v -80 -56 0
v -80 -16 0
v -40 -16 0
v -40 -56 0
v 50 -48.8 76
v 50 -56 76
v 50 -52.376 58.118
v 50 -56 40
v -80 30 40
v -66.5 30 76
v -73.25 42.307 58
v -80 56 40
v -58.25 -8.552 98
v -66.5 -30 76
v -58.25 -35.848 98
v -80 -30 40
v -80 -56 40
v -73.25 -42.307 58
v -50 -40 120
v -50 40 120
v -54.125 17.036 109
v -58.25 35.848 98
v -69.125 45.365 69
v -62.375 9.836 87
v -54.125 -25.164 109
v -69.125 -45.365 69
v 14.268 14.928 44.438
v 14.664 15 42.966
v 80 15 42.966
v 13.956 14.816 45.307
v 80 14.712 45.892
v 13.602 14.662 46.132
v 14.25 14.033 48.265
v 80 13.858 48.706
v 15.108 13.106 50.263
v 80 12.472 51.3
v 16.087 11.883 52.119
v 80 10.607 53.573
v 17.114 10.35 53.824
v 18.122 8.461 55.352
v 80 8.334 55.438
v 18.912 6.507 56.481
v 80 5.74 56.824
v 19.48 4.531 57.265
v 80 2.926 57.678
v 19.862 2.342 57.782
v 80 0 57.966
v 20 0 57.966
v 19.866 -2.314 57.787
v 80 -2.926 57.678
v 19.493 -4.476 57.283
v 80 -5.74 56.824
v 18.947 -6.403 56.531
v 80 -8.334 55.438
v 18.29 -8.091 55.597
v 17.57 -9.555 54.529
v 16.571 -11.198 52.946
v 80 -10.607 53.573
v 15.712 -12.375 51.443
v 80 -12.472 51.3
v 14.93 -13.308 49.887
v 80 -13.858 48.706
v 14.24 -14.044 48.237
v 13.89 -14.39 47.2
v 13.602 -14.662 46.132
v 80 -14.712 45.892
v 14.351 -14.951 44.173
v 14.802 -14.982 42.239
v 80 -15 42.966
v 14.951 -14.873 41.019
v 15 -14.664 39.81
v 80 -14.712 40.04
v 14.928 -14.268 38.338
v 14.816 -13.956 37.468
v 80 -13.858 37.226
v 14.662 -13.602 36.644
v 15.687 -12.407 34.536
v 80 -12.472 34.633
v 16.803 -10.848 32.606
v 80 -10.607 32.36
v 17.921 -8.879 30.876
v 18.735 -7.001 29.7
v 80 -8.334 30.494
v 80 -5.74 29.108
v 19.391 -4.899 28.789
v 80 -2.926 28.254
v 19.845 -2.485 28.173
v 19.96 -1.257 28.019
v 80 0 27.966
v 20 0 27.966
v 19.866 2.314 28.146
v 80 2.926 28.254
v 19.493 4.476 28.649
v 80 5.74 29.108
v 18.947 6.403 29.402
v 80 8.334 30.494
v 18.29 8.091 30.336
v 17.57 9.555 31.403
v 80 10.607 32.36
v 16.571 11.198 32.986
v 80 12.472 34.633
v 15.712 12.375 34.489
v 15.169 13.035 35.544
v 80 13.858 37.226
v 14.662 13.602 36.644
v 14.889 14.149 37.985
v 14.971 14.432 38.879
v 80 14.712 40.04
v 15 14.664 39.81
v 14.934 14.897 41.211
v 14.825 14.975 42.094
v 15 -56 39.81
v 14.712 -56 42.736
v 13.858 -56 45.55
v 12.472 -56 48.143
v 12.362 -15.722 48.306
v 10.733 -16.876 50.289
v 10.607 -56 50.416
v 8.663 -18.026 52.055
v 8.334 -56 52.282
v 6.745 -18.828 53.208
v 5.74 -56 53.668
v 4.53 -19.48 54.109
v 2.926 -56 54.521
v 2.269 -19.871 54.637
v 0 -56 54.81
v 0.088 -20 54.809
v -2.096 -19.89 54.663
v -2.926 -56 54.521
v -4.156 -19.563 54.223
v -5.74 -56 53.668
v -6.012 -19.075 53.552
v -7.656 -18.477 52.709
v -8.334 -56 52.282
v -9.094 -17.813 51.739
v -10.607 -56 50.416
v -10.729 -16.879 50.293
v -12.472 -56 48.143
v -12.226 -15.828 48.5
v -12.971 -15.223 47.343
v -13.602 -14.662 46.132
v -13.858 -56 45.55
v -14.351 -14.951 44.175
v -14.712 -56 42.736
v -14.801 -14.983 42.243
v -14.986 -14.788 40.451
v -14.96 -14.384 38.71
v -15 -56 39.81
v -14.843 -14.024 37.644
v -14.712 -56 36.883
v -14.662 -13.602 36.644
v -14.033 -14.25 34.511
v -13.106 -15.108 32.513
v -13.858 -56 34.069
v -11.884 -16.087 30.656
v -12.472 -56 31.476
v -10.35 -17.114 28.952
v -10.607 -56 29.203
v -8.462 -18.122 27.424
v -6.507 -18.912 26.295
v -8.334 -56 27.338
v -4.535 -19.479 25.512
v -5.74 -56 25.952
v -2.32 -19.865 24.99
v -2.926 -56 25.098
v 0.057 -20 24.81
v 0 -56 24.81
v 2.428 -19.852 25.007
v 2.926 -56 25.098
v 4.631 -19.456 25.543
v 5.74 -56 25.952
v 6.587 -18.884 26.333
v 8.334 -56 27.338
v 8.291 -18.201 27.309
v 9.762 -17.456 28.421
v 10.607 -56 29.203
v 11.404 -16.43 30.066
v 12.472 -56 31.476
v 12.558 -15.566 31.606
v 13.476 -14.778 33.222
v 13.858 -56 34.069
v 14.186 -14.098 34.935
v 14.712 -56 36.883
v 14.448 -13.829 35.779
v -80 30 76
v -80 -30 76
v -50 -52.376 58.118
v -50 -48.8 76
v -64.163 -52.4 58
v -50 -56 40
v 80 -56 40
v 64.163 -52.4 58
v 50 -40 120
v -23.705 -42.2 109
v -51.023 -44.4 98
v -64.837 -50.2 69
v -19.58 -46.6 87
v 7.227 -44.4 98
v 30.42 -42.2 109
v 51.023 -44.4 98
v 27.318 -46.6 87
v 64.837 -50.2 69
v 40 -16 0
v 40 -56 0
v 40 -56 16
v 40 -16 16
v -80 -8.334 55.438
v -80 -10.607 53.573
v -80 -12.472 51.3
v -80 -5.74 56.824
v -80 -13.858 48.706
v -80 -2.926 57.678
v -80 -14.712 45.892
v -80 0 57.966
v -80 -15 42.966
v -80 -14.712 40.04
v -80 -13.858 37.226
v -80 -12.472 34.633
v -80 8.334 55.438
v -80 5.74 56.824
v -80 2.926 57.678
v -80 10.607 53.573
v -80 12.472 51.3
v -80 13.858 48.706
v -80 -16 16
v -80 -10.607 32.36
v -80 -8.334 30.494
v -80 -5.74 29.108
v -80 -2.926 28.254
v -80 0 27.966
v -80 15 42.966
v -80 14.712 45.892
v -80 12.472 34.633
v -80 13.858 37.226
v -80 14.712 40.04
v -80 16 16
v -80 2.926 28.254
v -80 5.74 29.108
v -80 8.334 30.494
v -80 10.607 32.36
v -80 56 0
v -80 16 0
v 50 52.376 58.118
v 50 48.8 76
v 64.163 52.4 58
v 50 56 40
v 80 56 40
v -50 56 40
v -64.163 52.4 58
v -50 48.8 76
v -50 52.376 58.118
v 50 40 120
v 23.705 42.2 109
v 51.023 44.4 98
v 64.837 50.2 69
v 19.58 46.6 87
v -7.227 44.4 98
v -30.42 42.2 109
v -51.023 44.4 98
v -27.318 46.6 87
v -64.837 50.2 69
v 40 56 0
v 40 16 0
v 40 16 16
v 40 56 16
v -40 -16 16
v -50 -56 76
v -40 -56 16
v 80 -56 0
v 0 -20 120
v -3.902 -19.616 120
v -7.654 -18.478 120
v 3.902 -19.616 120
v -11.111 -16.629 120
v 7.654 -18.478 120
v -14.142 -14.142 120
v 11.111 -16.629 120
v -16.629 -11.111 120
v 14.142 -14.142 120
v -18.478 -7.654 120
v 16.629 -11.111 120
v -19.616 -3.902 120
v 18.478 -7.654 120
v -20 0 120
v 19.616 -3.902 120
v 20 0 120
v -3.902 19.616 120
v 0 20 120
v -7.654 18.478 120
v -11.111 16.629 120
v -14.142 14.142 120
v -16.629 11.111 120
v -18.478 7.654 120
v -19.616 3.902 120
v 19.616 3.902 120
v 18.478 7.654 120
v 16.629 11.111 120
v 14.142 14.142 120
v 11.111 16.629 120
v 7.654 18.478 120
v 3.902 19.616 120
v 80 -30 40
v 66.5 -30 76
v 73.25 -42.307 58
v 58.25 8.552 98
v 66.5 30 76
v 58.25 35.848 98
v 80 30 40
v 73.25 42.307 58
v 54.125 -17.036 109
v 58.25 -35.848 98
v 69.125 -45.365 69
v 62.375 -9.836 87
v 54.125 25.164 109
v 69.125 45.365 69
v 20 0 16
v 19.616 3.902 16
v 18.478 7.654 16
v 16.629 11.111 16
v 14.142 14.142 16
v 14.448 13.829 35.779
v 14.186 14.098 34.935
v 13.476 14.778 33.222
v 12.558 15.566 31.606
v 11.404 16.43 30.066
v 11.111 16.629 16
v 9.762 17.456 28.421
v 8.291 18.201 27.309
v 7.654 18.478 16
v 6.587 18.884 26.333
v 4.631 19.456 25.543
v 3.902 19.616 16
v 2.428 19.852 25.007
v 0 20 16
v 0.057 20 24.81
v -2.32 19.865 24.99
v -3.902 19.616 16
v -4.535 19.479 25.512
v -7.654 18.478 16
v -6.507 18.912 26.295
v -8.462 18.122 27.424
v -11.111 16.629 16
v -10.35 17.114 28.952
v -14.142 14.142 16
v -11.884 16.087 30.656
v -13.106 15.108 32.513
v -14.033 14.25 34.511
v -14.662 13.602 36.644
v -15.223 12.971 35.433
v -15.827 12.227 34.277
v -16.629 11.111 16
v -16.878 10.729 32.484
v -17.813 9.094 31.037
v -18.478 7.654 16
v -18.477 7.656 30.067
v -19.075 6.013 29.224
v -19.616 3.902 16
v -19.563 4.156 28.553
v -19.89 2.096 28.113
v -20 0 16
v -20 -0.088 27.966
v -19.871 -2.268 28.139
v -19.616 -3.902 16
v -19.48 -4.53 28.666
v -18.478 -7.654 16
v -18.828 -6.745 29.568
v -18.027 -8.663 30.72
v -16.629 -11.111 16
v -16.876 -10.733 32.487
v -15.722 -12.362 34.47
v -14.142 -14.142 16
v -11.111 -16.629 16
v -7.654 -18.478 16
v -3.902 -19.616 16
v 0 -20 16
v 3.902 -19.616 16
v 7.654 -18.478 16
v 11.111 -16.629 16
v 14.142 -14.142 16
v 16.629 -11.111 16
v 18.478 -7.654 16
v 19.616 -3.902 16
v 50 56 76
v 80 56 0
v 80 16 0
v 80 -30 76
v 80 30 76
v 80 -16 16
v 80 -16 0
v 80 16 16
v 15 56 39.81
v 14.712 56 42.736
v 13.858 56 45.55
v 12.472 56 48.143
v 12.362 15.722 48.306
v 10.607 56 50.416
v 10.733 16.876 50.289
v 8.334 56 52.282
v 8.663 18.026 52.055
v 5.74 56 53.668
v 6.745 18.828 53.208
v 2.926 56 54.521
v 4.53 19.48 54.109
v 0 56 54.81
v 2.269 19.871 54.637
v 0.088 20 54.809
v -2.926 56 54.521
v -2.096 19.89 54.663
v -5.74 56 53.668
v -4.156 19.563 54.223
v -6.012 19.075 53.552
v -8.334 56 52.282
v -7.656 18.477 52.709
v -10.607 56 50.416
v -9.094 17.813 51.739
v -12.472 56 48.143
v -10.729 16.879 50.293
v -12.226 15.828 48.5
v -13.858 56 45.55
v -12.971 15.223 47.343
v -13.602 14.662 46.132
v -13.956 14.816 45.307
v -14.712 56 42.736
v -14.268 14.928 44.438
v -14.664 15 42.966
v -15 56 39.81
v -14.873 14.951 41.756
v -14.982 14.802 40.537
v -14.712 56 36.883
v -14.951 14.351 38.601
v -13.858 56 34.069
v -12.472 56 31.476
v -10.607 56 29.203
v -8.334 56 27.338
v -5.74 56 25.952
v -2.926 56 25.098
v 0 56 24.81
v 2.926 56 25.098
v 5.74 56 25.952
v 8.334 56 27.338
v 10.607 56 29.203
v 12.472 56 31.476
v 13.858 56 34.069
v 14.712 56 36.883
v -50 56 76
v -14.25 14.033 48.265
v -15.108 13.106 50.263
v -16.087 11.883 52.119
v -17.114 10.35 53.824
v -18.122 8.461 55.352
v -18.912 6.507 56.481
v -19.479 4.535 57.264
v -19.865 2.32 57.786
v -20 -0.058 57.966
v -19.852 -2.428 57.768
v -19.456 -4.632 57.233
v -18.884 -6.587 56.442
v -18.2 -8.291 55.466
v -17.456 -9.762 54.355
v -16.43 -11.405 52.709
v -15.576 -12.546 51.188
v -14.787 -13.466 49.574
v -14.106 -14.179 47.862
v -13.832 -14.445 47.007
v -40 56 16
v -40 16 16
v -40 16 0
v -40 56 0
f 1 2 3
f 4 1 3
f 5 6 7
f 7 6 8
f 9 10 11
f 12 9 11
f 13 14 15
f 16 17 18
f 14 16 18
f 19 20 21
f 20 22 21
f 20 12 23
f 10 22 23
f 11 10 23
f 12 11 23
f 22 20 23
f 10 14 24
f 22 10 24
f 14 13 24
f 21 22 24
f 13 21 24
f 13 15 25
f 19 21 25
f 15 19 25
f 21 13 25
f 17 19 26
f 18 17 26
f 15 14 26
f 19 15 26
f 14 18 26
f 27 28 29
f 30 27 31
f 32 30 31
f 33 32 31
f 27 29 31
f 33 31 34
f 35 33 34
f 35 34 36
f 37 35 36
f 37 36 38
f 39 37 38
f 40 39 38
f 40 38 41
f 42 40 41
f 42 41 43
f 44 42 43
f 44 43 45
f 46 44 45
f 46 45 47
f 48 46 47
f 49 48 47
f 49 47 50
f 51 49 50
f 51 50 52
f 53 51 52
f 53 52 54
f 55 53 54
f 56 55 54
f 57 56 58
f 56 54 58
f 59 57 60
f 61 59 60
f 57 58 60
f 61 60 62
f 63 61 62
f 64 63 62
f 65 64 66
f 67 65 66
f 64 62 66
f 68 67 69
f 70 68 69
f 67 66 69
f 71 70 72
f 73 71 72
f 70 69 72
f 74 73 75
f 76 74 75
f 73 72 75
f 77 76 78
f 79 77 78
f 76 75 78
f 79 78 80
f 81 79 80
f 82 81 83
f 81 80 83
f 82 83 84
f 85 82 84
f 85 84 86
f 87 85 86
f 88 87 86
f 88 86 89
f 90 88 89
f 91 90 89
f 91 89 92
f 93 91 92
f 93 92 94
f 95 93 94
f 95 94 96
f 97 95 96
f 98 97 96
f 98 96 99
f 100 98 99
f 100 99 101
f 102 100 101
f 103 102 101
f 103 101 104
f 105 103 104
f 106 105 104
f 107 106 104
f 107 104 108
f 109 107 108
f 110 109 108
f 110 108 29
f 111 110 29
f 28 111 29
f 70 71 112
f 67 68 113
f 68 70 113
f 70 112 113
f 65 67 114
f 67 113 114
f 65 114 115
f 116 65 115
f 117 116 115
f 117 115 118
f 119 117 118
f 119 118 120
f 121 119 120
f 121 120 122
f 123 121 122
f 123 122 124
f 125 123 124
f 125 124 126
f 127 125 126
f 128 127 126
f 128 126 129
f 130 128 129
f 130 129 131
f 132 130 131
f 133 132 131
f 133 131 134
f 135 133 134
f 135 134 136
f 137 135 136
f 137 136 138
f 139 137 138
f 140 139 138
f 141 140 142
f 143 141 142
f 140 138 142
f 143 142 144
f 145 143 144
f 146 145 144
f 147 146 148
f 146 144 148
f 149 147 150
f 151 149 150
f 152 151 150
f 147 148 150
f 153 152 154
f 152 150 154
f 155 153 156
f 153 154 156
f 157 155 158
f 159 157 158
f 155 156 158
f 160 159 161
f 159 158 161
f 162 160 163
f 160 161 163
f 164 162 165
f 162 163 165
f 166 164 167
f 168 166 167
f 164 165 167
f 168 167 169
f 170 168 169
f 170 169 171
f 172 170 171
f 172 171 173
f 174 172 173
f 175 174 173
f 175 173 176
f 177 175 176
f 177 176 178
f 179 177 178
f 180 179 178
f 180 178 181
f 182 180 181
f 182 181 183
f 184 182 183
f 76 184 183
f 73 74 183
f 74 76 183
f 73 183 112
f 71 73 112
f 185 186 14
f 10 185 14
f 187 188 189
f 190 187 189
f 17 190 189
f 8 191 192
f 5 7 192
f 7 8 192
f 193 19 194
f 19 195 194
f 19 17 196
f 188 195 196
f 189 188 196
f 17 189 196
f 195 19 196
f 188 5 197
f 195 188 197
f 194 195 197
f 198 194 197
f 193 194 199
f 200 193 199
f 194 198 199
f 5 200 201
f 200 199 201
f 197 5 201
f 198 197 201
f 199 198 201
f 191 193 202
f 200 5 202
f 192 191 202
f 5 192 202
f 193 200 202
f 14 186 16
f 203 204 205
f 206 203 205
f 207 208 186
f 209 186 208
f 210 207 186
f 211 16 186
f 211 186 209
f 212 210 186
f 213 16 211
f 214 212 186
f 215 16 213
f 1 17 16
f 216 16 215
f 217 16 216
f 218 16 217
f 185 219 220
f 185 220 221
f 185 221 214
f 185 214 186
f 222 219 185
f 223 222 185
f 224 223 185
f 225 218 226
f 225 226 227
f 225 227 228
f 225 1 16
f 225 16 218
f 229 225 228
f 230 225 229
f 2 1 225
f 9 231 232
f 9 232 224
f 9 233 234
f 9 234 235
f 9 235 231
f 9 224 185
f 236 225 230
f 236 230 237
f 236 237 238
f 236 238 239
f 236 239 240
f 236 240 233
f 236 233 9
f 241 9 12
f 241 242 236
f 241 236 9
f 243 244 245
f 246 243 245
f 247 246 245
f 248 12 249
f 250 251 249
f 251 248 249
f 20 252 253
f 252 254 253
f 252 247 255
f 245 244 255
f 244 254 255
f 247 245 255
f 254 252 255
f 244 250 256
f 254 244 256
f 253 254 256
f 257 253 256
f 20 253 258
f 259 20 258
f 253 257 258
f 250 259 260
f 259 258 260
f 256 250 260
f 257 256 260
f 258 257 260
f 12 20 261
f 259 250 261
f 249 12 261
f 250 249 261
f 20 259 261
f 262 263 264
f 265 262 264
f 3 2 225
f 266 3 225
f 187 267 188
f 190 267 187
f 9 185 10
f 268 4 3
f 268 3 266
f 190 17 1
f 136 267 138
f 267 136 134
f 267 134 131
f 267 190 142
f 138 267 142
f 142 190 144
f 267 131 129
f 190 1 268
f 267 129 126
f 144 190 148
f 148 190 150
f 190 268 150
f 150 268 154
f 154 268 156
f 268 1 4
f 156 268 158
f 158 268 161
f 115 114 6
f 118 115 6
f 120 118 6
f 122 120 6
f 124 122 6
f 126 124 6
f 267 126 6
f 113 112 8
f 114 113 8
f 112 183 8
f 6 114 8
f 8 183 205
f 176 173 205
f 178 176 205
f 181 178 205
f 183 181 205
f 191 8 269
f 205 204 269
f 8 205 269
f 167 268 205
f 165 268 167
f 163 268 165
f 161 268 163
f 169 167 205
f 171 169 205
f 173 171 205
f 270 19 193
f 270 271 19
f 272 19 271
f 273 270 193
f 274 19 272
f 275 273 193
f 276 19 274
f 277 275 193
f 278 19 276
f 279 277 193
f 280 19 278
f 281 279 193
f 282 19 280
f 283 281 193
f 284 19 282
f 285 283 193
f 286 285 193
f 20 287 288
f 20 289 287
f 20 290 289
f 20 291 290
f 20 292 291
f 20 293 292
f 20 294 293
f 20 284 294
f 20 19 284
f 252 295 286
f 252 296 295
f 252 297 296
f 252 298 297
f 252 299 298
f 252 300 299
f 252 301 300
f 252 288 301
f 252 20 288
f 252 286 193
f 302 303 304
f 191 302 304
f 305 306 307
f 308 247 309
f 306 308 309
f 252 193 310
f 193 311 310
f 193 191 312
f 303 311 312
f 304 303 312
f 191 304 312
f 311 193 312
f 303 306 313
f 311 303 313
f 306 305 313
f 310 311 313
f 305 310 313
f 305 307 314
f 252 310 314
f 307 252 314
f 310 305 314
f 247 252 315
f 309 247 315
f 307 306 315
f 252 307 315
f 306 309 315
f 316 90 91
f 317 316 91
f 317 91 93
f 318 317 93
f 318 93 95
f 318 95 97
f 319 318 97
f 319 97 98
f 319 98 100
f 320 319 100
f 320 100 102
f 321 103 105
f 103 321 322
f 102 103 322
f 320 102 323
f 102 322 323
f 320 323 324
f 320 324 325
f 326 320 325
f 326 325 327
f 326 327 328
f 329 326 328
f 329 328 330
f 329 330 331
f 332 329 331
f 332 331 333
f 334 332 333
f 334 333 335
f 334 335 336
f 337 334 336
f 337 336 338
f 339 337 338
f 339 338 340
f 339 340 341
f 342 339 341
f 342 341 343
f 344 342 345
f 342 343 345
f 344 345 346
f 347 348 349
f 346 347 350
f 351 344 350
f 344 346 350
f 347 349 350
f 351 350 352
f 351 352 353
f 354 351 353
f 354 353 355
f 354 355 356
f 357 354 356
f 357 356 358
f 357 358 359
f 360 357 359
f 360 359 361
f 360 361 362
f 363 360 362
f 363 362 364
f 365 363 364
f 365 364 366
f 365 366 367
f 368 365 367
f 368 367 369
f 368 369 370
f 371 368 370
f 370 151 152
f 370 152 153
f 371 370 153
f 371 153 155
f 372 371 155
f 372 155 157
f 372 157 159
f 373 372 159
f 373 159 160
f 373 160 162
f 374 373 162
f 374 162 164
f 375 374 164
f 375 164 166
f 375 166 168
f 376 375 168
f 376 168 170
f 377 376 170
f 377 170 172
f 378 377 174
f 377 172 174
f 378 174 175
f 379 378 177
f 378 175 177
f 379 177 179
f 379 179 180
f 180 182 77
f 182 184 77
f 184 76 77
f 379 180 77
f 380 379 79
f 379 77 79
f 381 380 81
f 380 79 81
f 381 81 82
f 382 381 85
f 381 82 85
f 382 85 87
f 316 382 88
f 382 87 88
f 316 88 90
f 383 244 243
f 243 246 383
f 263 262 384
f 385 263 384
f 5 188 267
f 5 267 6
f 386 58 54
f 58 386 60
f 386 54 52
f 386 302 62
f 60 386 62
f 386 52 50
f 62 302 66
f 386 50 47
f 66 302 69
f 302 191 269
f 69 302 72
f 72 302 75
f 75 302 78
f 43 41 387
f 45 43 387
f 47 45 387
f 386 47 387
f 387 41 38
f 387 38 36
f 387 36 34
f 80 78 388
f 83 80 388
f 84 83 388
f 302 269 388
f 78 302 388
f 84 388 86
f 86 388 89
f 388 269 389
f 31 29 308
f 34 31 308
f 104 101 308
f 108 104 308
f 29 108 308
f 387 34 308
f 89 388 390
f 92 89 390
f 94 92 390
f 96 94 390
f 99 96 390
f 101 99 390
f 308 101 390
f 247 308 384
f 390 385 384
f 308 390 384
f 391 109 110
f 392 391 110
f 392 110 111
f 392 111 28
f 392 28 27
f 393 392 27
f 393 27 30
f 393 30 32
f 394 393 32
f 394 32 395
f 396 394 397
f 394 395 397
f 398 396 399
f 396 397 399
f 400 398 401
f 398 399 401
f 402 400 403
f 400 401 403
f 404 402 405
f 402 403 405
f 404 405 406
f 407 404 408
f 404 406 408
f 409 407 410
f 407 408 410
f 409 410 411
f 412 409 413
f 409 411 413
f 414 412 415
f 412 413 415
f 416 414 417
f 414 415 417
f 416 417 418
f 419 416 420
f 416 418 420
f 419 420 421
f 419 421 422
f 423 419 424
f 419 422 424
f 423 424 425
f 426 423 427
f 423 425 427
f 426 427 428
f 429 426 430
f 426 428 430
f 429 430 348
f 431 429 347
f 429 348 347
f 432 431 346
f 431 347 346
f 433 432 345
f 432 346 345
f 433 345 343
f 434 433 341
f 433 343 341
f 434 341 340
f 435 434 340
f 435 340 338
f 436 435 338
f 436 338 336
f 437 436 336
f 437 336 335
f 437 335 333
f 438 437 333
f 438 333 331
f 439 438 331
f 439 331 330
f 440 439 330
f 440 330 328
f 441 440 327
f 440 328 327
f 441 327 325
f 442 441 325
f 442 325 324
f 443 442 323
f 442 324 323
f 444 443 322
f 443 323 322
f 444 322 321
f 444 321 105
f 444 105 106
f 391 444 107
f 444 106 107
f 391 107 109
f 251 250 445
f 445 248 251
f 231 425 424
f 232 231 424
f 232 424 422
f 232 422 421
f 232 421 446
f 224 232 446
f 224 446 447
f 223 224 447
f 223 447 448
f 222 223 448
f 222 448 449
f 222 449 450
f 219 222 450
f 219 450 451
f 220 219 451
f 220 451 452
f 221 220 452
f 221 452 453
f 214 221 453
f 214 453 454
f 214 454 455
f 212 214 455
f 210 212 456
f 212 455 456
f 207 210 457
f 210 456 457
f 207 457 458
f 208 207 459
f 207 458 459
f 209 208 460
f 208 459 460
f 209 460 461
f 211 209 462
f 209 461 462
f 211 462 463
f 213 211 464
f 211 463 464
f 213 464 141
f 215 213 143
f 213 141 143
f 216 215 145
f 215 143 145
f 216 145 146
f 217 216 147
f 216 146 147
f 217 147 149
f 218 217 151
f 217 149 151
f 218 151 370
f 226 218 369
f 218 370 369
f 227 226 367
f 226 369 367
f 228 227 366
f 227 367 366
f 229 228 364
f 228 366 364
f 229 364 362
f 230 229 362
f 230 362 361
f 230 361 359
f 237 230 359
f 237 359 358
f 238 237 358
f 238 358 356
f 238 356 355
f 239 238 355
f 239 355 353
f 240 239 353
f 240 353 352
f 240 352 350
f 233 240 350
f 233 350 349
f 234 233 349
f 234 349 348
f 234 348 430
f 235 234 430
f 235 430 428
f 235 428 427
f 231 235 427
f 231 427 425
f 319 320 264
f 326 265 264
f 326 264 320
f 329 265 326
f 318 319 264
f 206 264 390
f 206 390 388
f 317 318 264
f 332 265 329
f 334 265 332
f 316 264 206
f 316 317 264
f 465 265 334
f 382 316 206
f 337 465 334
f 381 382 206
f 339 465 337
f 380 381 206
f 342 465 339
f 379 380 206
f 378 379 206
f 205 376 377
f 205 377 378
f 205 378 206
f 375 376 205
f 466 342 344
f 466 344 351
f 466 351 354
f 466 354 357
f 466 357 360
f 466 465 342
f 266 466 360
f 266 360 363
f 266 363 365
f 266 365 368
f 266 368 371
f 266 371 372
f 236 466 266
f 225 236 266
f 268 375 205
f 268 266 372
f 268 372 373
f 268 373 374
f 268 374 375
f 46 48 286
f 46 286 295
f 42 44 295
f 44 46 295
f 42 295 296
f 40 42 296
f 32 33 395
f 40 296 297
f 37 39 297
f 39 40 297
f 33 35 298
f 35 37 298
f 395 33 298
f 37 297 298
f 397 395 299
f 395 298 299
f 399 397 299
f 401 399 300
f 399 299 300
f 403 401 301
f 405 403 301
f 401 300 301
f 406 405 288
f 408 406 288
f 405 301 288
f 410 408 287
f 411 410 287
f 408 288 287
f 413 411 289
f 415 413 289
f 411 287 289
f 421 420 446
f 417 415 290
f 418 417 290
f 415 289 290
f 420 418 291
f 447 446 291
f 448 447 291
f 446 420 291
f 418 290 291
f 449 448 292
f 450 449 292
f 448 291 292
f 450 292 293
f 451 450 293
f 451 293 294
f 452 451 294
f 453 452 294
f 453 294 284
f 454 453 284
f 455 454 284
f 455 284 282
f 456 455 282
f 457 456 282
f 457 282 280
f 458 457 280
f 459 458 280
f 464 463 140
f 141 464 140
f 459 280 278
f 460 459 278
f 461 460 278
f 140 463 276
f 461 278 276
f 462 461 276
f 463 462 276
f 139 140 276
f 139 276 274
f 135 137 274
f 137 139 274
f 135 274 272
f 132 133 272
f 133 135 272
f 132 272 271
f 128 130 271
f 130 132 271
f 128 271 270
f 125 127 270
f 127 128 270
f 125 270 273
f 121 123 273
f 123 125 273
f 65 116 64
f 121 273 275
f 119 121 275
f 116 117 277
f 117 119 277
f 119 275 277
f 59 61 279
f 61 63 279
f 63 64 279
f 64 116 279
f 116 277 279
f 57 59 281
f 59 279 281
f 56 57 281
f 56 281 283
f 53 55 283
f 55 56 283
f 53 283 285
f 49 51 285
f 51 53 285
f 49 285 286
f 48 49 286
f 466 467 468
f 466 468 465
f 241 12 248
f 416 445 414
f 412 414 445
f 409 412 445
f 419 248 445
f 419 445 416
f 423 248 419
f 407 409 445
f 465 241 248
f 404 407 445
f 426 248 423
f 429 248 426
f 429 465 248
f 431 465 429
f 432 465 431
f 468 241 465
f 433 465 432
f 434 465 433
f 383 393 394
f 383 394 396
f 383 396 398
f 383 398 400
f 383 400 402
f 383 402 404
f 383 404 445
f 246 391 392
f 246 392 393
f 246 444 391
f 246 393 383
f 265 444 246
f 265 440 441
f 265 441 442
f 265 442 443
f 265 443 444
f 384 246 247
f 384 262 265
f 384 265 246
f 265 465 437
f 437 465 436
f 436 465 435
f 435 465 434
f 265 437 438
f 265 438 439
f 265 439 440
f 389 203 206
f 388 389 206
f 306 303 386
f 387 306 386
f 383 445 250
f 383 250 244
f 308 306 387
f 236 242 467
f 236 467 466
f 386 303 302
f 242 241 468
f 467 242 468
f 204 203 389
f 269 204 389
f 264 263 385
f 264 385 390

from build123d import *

# Parameters (mm, degrees)
F0_W      = 160
F0_H      = 112
F1_DEPTH  = 40
F2_W      = 80
F2_H      = 16
F3_DEPTH  = 112
F4_W      = 32
F4_H      = 16
F5_DEPTH  = 160
F6_W      = 100
F6_H      = 112
F7_DEPTH  = 36
F8_W      = 30
F8_H      = 60
F9_DEPTH  = 36
F10_W     = 30
F10_H     = 60
F11_DEPTH = 36
F15_W     = 100
F15_H     = 80
F13_W     = 160
F13_H     = 112
F17_R     = 20
F18_DEPTH = 120
F19_R     = 15
F20_DEPTH = 160
F21_R     = 15
F22_DEPTH = 112


with BuildPart() as f1:
    # F0 (on Top) → F1 (new body)
    with BuildSketch(Plane.XY):
        Rectangle(F0_W, F0_H)
    extrude(amount=F1_DEPTH)

    # F2 (on face) → F3 (cut)
    with BuildSketch(Plane.XZ.offset(56)):
        with Locations((0, 8)):
            Rectangle(F2_W, F2_H)
    extrude(amount=-F3_DEPTH, mode=Mode.SUBTRACT)

    # F4 (on face) → F5 (cut)
    with BuildSketch(Plane(origin=(-80, 0, 0), x_dir=(0, -1, 0), z_dir=(-1, 0, 0))):
        with Locations((0, 8)):
            Rectangle(F4_W, F4_H)
    extrude(amount=-F5_DEPTH, mode=Mode.SUBTRACT)

    # F6 (on face) → F7 (join)
    with BuildSketch(Plane.XY.offset(40)):
        Rectangle(F6_W, F6_H)
    extrude(amount=F7_DEPTH)

    # F8 (on face) → F9 (join)
    with BuildSketch(Plane.XY.offset(40)):
        with Locations((65, 0)):
            Rectangle(F8_W, F8_H)
    extrude(amount=F9_DEPTH)

    # F10 (on face) → F11 (join)
    with BuildSketch(Plane.XY.offset(40)):
        with Locations((-65, 0)):
            Rectangle(F10_W, F10_H)
    extrude(amount=F11_DEPTH)

    # F15 (on offset) → F16 section 0
    with BuildSketch(Plane.XY.offset(120)):
        Rectangle(F15_W, F15_H)
    # F13 (on offset) → F16 section 1
    with BuildSketch(Plane.XY.offset(40)):
        Rectangle(F13_W, F13_H)
    loft()

    # F17 (on offset) → F18 (cut)
    with BuildSketch(Plane.XY.offset(120)):
        Circle(F17_R)
    extrude(amount=-F18_DEPTH, mode=Mode.SUBTRACT)

    # F19 (on face) → F20 (cut)
    with BuildSketch(Plane.YZ.offset(80)):
        with Locations((0, 42.966103)):
            Circle(F19_R)
    extrude(amount=-F20_DEPTH, mode=Mode.SUBTRACT)

    # F21 (on face) → F22 (cut)
    with BuildSketch(Plane.XZ.offset(56)):
        with Locations((0, 39.809708)):
            Circle(F21_R)
    extrude(amount=-F22_DEPTH, mode=Mode.SUBTRACT)


solid = f1.part
